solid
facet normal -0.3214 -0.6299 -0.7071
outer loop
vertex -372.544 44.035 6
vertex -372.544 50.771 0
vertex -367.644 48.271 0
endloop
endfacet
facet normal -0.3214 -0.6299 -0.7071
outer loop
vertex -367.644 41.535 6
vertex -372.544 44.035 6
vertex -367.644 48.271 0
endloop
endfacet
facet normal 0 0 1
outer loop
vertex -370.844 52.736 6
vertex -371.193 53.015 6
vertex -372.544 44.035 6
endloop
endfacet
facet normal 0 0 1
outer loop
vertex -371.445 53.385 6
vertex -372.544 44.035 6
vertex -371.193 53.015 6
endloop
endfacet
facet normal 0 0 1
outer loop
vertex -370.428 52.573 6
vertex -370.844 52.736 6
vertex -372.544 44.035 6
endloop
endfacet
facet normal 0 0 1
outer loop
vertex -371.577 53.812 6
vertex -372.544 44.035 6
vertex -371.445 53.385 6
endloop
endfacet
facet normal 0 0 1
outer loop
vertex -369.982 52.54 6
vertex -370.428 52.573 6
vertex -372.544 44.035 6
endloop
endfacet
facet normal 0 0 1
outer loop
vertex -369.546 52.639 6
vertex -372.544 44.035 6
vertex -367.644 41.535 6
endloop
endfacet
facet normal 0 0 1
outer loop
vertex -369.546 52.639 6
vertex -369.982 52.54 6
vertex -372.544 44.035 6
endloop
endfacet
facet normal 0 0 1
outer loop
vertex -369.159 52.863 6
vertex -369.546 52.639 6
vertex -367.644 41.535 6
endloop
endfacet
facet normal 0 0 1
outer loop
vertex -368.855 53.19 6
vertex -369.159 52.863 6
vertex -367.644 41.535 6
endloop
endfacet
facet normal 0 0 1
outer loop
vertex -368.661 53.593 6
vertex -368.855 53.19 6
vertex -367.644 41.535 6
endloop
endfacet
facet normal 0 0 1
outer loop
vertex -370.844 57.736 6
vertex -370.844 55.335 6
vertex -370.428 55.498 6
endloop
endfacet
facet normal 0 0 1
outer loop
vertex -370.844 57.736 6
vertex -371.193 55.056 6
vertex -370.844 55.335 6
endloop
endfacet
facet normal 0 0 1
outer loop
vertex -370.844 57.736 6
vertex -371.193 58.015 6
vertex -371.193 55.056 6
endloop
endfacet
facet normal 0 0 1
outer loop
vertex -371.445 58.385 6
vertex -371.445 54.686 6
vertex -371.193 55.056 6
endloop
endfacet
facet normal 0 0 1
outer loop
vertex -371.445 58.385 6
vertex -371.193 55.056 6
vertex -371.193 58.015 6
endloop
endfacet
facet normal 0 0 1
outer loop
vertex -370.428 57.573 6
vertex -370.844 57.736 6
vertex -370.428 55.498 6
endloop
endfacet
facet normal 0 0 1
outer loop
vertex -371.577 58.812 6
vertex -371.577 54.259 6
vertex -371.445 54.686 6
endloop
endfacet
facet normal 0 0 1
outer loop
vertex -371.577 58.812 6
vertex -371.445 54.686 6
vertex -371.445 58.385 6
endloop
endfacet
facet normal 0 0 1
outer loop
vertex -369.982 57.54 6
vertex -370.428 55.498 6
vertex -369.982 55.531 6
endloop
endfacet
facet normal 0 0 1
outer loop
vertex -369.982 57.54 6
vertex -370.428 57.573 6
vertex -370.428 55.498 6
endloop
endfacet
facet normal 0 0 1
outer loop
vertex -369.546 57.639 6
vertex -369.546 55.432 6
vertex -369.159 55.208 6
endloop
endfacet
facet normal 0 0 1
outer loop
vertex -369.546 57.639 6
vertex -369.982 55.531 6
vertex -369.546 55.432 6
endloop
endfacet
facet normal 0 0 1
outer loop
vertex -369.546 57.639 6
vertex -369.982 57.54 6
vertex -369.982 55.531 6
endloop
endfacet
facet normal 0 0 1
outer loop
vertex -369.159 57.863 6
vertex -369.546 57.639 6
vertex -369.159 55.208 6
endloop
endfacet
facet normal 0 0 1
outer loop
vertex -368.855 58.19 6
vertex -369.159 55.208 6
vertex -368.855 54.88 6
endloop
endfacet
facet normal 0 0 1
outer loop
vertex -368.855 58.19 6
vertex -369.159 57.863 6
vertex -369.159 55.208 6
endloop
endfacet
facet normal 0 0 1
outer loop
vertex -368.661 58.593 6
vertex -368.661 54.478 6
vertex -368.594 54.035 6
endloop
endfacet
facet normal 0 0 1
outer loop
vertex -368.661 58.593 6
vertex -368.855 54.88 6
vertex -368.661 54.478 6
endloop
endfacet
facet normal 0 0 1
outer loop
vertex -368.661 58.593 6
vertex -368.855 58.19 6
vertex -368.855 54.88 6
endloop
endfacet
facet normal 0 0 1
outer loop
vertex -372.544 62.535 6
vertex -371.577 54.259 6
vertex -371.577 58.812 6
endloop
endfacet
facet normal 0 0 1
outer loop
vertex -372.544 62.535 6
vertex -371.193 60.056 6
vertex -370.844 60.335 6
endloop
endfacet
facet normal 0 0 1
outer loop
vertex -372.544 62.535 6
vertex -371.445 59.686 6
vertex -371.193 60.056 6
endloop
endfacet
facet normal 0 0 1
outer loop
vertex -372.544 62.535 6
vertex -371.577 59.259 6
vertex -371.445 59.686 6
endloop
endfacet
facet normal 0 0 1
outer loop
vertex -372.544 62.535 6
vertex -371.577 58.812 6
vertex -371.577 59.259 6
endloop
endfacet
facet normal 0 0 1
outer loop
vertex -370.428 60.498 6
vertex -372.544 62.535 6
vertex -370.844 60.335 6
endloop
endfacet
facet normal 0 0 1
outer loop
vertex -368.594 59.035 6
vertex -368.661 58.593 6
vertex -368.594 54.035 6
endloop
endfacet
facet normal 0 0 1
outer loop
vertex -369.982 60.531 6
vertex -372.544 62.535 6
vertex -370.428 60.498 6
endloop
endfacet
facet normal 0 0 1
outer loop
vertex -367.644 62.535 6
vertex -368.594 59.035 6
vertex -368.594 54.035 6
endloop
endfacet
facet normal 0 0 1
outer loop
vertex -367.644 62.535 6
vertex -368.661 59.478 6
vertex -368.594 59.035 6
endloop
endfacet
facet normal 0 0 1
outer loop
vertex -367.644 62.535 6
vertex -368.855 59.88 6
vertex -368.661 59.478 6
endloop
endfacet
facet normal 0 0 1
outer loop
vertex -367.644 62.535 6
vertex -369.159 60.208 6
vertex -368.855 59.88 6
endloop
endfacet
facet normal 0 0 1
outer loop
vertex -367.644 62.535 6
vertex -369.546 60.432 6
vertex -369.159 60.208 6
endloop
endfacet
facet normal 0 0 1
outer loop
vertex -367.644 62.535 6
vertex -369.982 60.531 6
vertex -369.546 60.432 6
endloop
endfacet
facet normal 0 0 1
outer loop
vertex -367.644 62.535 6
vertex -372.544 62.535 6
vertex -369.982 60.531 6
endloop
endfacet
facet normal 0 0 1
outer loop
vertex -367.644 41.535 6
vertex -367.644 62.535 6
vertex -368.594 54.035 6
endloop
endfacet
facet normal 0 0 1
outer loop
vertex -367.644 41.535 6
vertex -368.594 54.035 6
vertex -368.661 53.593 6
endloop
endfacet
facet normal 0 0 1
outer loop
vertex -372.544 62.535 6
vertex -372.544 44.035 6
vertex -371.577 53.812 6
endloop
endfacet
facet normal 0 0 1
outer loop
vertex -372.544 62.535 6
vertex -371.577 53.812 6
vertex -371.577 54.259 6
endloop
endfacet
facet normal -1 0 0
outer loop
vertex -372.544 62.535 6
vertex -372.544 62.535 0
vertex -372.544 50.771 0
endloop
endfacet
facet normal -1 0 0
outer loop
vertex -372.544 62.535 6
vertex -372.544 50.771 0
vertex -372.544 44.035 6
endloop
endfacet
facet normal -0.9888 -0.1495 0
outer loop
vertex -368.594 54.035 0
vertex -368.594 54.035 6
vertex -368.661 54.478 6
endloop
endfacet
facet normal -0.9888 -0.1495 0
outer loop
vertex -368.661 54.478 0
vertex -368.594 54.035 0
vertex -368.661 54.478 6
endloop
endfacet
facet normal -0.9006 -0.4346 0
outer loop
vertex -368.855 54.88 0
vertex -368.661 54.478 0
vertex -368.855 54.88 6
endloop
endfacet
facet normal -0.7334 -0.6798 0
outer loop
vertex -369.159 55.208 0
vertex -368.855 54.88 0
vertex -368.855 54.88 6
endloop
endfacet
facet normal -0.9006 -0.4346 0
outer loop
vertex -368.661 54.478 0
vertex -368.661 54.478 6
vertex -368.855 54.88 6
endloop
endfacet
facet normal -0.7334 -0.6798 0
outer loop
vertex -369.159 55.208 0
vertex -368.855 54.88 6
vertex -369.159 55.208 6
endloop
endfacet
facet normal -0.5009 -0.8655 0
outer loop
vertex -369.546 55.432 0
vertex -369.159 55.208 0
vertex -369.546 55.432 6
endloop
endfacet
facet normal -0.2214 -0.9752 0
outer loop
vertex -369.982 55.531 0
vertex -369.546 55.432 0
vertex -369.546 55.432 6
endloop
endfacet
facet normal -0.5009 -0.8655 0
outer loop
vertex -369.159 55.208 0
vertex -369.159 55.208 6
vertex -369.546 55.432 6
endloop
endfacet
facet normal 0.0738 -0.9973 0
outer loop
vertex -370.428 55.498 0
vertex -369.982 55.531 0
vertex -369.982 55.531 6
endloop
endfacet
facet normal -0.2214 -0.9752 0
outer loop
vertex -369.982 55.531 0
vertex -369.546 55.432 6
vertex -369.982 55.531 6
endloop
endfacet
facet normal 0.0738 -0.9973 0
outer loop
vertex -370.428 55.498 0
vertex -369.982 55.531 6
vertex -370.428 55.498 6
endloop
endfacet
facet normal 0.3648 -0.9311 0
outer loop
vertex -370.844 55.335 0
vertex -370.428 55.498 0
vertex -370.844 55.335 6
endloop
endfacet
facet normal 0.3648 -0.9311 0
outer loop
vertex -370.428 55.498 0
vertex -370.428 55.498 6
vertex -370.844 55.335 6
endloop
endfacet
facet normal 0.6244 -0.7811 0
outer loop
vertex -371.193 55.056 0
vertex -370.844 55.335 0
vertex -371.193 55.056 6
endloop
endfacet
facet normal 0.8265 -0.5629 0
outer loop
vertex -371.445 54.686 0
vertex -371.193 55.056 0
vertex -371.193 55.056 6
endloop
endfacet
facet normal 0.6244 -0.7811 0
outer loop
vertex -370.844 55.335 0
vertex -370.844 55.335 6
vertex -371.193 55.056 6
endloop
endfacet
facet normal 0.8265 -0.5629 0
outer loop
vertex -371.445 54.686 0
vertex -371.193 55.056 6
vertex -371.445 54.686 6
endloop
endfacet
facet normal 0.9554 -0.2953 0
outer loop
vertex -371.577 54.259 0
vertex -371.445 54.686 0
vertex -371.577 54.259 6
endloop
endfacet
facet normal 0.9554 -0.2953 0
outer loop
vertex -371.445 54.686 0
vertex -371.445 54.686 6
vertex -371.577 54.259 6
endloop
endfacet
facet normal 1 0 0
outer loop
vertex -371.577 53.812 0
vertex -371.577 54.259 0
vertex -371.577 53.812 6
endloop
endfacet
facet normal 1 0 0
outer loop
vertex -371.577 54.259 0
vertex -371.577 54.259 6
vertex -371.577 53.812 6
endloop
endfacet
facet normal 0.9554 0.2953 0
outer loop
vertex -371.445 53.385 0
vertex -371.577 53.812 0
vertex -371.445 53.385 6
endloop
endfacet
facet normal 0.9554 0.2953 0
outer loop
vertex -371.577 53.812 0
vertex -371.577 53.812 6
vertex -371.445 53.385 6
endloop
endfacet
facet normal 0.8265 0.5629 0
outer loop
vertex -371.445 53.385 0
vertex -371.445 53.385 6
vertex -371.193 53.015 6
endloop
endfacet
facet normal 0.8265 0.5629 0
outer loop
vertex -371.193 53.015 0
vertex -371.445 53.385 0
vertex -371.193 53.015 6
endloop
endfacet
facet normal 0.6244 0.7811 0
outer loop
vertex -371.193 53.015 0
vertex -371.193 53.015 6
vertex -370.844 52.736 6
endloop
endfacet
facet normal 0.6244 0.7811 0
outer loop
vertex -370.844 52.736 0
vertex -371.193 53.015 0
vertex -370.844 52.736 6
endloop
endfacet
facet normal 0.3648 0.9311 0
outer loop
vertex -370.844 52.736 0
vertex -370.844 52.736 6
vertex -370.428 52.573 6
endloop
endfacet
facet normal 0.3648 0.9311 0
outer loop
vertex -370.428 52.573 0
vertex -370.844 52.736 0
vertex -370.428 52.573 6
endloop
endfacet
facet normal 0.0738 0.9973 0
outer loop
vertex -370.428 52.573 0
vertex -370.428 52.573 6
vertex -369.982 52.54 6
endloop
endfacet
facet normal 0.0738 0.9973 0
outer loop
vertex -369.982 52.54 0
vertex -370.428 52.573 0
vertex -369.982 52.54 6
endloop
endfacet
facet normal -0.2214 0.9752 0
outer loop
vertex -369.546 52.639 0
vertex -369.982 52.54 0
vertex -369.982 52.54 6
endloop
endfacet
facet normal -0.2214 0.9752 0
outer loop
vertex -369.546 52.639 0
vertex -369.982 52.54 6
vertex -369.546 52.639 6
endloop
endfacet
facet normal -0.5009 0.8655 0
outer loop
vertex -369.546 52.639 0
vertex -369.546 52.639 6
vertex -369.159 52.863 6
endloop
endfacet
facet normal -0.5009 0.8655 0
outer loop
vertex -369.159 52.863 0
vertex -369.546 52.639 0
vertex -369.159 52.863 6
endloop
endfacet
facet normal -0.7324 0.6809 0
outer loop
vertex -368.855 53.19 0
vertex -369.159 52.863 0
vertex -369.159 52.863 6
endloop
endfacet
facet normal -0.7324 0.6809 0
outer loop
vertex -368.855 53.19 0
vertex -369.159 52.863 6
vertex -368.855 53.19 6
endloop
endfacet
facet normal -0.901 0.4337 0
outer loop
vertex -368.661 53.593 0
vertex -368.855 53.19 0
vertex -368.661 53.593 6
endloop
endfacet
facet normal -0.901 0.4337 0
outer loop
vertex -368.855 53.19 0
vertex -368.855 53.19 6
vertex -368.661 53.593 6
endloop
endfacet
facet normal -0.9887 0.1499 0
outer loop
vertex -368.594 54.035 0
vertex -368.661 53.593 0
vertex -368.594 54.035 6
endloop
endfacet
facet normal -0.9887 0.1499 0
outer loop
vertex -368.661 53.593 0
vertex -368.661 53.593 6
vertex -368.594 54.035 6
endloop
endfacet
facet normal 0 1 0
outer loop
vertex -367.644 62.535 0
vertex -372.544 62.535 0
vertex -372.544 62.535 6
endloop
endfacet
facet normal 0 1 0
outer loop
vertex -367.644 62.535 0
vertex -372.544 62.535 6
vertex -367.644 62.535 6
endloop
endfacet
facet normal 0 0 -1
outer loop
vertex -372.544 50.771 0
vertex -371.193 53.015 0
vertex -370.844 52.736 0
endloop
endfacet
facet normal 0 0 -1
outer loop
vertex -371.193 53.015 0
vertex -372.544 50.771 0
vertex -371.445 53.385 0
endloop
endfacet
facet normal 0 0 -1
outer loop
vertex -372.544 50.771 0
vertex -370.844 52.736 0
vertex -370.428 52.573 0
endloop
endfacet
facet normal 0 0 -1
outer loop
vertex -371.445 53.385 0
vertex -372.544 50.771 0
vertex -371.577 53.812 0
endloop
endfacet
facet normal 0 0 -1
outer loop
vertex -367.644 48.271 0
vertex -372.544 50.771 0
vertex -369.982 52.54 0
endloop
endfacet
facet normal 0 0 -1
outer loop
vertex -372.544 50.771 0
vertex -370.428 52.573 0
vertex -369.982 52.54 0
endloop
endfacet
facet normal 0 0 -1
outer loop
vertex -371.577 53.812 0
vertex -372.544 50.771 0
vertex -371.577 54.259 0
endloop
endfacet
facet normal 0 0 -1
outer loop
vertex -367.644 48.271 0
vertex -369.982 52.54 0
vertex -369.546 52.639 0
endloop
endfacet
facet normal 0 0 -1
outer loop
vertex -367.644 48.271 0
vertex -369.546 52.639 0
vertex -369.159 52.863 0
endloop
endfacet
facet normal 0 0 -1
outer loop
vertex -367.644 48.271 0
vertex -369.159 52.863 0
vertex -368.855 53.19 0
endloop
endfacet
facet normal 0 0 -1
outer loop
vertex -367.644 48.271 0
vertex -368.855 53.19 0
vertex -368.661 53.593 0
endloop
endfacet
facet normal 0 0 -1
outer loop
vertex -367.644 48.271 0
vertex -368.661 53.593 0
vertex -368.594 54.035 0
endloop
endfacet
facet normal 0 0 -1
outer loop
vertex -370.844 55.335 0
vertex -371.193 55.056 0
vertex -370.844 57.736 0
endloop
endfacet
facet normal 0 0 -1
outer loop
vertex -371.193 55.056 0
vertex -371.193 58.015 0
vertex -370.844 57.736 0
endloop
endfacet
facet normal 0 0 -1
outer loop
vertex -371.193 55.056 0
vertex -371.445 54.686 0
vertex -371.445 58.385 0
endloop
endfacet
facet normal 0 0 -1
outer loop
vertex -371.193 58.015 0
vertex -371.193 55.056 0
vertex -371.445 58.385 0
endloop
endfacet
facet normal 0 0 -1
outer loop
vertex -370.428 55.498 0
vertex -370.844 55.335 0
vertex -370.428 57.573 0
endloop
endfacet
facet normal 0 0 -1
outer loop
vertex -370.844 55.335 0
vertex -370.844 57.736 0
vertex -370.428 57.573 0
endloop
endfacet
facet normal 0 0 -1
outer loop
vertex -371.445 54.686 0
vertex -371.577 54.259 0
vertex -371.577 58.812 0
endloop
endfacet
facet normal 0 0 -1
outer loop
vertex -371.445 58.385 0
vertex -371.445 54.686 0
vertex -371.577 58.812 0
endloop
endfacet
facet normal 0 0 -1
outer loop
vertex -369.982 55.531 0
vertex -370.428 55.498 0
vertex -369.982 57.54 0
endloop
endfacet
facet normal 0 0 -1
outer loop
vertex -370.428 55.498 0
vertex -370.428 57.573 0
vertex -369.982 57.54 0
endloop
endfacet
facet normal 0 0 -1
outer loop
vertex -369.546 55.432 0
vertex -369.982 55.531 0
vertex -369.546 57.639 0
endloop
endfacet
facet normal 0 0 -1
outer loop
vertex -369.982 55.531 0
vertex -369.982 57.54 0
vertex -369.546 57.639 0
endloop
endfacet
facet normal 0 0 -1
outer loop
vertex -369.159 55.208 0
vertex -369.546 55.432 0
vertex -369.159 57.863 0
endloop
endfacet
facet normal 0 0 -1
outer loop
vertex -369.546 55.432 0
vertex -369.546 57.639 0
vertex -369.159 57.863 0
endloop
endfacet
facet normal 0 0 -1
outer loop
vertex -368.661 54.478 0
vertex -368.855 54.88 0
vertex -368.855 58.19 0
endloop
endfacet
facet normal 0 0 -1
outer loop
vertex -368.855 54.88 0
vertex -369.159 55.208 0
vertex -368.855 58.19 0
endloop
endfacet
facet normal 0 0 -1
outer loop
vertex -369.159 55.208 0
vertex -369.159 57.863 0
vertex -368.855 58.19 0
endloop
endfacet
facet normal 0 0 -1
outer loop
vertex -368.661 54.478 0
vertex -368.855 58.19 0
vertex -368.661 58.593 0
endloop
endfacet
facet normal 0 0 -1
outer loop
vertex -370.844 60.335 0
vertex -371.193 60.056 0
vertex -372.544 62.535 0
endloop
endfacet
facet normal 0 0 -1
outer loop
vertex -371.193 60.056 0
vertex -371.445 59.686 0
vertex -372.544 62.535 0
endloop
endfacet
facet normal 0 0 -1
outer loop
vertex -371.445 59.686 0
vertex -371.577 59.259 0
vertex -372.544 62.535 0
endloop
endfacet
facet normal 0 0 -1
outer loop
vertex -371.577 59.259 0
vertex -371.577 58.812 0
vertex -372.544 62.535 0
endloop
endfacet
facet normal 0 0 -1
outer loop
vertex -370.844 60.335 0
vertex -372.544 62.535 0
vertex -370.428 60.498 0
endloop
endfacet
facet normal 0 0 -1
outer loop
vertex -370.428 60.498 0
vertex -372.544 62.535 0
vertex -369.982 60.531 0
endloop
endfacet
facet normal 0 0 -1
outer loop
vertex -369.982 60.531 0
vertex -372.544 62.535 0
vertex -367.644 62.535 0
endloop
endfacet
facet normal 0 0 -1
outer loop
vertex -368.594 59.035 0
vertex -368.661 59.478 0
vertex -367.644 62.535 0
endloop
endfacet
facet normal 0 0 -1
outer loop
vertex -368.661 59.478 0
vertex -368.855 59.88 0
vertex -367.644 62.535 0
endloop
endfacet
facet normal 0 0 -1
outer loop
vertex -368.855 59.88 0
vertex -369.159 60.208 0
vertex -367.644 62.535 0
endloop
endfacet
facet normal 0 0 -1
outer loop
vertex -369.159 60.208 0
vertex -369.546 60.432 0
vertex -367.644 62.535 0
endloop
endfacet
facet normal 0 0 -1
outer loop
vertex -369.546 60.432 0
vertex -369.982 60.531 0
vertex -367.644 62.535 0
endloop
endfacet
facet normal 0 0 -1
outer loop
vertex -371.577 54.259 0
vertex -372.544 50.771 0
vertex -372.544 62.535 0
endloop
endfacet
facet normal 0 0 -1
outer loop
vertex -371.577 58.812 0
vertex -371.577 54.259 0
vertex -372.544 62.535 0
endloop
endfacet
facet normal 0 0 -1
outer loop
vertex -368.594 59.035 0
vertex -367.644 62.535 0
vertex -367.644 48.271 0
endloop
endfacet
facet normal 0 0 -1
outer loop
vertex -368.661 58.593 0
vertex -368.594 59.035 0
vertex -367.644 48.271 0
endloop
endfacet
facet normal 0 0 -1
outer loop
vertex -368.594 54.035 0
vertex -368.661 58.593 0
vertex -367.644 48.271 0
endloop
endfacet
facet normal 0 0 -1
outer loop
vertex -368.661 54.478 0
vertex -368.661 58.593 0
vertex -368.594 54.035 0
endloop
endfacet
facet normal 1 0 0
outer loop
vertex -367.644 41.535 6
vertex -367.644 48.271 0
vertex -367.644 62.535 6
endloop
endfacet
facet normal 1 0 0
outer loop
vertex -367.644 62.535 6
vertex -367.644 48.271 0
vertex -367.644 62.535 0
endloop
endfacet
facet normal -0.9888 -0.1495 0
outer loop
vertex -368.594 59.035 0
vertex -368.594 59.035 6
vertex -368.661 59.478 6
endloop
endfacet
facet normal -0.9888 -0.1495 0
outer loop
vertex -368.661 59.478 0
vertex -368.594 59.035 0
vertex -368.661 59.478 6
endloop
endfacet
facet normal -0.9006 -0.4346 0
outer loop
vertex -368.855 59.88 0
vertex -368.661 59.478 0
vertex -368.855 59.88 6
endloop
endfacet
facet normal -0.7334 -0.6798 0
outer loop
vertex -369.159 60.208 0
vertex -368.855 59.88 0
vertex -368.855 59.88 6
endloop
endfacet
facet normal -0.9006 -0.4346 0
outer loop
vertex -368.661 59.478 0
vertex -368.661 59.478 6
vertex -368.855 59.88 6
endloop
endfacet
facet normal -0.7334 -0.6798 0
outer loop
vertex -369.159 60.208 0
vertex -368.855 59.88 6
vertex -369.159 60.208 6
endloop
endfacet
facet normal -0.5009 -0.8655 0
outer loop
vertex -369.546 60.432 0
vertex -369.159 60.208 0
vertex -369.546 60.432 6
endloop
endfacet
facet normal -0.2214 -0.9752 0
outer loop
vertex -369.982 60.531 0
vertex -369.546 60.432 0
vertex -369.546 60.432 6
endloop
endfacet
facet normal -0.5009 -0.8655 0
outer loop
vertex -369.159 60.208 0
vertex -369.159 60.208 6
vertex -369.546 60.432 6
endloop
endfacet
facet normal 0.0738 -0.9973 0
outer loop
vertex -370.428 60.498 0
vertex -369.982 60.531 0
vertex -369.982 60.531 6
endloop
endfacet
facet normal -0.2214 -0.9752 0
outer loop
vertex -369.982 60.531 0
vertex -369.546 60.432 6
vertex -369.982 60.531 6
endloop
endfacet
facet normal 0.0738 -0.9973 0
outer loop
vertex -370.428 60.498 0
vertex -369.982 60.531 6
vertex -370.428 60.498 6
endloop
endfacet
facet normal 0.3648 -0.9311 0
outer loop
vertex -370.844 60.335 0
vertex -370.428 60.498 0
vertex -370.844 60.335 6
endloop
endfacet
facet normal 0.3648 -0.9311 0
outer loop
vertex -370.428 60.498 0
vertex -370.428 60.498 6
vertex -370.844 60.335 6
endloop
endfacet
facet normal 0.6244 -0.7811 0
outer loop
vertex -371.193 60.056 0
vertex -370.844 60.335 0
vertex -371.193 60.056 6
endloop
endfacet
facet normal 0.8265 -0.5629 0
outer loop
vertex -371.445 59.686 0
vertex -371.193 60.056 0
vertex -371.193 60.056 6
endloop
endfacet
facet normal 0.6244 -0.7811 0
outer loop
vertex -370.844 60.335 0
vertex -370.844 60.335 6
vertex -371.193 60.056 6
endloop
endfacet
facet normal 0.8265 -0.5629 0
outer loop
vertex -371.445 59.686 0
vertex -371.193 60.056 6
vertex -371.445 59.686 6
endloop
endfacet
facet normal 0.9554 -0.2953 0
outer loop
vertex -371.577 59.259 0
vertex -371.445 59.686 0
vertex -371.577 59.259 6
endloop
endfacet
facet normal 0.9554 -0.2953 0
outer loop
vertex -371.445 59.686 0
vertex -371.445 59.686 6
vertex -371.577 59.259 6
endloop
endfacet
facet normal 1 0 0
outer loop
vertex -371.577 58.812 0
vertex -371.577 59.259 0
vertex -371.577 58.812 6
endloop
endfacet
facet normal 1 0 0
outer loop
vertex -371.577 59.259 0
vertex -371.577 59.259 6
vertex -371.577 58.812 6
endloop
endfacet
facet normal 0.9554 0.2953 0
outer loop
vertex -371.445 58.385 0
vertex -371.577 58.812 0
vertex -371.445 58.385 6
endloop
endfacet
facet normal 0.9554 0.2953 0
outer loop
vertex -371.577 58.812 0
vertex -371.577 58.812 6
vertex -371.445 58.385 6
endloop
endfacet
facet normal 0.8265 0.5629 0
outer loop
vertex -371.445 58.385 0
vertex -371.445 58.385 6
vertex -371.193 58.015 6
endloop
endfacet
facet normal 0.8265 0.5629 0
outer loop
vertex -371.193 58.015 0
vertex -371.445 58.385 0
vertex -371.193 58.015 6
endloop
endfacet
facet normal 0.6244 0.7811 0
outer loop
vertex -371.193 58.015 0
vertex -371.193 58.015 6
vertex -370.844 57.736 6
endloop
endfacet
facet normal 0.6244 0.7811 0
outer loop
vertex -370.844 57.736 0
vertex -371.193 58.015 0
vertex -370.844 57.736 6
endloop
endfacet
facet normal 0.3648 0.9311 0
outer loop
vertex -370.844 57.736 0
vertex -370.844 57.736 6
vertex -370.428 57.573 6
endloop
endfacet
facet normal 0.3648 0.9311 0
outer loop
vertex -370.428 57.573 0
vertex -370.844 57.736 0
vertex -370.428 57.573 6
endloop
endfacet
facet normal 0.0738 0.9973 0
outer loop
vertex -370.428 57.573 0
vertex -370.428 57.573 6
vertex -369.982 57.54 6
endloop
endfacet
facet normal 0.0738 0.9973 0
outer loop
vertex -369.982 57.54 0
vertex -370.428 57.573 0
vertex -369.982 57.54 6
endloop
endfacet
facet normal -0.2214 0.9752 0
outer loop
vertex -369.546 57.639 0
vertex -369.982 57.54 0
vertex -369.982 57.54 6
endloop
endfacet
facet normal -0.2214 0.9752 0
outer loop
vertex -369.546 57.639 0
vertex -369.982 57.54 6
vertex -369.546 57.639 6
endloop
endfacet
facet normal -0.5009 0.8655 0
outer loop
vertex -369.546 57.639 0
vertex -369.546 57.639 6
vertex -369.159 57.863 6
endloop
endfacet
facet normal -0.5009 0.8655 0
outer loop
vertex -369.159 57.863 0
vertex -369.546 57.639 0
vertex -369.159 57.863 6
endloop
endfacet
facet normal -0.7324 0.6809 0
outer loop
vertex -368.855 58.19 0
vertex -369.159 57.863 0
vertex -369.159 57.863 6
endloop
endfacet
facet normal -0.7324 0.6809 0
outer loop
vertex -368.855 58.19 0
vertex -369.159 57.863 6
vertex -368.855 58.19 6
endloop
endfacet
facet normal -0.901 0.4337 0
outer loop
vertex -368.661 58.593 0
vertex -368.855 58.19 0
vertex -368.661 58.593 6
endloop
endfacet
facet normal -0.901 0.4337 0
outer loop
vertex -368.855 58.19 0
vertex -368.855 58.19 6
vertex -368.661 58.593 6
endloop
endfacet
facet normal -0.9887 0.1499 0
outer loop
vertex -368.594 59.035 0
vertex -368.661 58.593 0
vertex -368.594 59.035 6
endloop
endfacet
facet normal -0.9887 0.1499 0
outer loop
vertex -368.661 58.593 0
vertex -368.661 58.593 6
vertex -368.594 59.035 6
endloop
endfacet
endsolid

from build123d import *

# Parameters (mm, degrees)
F1_DEPTH = 6
F2_SIZE  = 5.99999
F3_W     = 4.9
F3_H     = 9
F3_R     = 1.5
F4_DEPTH = 6


# Not quite as in the source:
# - a fillet or chamfer is up to 0.001 mm smaller than in the source, because OpenCascade refuses the exact size


with BuildPart() as f1:
    # F0 (on Top) → F1 (new body)
    with BuildSketch(Plane.XY):
        Polygon((-367.6438903809, 71.5354757011), (-372.5438903809, 71.5354757011), (-372.5438903809, 44.0354757011), (-367.6438903809, 41.5354757011), align=None)
    extrude(amount=F1_DEPTH)

    # F2 (size 6 in the source; OpenCascade refuses exactly that, so slightly less here)
    f2_edges = [f1.edges().sort_by_distance(p)[0] for p in [
        (-370.09389, 42.785476, 0),
    ]]
    chamfer(f2_edges, length=F2_SIZE)

    # F3 (on face) → F4 (cut, through all)
    with BuildSketch(Plane.XY.offset(6)):
        with Locations((-370.0938903809, 67.0354757011)):
            Rectangle(F3_W, F3_H)
        with Locations((-370.0938903809, 59.0354757011)):
            Circle(F3_R)
        with Locations((-370.0938903809, 54.0354757011)):
            Circle(F3_R)
    extrude(amount=-F4_DEPTH, mode=Mode.SUBTRACT)


solid = f1.part
